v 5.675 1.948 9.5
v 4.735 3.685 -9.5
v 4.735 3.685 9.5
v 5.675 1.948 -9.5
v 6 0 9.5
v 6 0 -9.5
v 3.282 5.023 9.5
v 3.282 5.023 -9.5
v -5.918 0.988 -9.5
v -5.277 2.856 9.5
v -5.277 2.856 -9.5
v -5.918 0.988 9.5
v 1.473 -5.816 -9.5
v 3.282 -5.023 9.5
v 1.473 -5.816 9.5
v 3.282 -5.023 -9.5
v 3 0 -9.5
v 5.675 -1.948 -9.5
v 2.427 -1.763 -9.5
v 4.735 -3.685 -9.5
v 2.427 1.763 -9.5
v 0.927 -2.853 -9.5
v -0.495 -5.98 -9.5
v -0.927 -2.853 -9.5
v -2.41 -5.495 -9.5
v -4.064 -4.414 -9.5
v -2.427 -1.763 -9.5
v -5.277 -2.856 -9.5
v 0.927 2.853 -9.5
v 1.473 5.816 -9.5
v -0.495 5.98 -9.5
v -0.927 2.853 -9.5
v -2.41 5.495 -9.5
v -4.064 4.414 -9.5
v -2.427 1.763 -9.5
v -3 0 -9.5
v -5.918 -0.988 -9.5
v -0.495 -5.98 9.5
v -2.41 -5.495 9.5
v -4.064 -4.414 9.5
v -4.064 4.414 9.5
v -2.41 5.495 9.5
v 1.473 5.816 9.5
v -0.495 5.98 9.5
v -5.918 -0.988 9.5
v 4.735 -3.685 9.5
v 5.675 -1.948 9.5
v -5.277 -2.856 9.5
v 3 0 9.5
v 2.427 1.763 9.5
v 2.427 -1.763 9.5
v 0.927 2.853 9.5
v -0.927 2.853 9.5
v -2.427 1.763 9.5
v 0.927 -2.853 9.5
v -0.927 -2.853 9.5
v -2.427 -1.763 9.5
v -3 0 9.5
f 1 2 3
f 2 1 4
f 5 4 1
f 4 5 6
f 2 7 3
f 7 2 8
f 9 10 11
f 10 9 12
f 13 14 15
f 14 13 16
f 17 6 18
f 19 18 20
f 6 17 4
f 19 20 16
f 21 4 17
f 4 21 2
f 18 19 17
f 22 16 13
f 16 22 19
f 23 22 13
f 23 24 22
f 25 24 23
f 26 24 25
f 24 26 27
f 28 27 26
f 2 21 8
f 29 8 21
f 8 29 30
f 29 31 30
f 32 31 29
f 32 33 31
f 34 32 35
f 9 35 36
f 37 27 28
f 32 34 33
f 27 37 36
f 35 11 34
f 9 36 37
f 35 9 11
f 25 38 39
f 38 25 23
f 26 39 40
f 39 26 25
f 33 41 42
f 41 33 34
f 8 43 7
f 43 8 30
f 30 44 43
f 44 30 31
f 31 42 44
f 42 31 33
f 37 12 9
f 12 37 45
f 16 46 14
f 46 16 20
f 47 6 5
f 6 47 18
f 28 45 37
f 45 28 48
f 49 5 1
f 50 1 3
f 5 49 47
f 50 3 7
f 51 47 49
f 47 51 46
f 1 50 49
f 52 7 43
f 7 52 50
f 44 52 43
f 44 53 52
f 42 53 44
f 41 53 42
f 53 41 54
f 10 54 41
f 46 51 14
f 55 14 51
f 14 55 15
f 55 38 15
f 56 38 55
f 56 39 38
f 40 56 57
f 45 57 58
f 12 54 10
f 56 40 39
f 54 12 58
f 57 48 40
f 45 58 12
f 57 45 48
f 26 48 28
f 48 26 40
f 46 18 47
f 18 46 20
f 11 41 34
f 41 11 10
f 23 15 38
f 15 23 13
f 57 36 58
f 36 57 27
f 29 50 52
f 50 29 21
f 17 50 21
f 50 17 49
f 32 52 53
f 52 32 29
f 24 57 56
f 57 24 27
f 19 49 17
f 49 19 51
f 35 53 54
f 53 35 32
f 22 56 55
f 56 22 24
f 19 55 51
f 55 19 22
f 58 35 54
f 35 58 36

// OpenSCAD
// Parameters
inner_bore_diameter = 6.0;
outer_diameter = 12.0;
length = 19.0;

// Linear bearing body
module linear_bearing_body() {
    cylinder(d = outer_diameter, h = length, center = true);
}

// Inner bore
module inner_bore() {
    cylinder(d = inner_bore_diameter, h = length + 2, center = true);
}

// Outer casing
module outer_casing() {
    difference() {
        linear_bearing_body();
        inner_bore();
    }
}

// Linear bearing assembly
module linear_bearing() {
    outer_casing();
}

// Render the linear bearing
linear_bearing();
